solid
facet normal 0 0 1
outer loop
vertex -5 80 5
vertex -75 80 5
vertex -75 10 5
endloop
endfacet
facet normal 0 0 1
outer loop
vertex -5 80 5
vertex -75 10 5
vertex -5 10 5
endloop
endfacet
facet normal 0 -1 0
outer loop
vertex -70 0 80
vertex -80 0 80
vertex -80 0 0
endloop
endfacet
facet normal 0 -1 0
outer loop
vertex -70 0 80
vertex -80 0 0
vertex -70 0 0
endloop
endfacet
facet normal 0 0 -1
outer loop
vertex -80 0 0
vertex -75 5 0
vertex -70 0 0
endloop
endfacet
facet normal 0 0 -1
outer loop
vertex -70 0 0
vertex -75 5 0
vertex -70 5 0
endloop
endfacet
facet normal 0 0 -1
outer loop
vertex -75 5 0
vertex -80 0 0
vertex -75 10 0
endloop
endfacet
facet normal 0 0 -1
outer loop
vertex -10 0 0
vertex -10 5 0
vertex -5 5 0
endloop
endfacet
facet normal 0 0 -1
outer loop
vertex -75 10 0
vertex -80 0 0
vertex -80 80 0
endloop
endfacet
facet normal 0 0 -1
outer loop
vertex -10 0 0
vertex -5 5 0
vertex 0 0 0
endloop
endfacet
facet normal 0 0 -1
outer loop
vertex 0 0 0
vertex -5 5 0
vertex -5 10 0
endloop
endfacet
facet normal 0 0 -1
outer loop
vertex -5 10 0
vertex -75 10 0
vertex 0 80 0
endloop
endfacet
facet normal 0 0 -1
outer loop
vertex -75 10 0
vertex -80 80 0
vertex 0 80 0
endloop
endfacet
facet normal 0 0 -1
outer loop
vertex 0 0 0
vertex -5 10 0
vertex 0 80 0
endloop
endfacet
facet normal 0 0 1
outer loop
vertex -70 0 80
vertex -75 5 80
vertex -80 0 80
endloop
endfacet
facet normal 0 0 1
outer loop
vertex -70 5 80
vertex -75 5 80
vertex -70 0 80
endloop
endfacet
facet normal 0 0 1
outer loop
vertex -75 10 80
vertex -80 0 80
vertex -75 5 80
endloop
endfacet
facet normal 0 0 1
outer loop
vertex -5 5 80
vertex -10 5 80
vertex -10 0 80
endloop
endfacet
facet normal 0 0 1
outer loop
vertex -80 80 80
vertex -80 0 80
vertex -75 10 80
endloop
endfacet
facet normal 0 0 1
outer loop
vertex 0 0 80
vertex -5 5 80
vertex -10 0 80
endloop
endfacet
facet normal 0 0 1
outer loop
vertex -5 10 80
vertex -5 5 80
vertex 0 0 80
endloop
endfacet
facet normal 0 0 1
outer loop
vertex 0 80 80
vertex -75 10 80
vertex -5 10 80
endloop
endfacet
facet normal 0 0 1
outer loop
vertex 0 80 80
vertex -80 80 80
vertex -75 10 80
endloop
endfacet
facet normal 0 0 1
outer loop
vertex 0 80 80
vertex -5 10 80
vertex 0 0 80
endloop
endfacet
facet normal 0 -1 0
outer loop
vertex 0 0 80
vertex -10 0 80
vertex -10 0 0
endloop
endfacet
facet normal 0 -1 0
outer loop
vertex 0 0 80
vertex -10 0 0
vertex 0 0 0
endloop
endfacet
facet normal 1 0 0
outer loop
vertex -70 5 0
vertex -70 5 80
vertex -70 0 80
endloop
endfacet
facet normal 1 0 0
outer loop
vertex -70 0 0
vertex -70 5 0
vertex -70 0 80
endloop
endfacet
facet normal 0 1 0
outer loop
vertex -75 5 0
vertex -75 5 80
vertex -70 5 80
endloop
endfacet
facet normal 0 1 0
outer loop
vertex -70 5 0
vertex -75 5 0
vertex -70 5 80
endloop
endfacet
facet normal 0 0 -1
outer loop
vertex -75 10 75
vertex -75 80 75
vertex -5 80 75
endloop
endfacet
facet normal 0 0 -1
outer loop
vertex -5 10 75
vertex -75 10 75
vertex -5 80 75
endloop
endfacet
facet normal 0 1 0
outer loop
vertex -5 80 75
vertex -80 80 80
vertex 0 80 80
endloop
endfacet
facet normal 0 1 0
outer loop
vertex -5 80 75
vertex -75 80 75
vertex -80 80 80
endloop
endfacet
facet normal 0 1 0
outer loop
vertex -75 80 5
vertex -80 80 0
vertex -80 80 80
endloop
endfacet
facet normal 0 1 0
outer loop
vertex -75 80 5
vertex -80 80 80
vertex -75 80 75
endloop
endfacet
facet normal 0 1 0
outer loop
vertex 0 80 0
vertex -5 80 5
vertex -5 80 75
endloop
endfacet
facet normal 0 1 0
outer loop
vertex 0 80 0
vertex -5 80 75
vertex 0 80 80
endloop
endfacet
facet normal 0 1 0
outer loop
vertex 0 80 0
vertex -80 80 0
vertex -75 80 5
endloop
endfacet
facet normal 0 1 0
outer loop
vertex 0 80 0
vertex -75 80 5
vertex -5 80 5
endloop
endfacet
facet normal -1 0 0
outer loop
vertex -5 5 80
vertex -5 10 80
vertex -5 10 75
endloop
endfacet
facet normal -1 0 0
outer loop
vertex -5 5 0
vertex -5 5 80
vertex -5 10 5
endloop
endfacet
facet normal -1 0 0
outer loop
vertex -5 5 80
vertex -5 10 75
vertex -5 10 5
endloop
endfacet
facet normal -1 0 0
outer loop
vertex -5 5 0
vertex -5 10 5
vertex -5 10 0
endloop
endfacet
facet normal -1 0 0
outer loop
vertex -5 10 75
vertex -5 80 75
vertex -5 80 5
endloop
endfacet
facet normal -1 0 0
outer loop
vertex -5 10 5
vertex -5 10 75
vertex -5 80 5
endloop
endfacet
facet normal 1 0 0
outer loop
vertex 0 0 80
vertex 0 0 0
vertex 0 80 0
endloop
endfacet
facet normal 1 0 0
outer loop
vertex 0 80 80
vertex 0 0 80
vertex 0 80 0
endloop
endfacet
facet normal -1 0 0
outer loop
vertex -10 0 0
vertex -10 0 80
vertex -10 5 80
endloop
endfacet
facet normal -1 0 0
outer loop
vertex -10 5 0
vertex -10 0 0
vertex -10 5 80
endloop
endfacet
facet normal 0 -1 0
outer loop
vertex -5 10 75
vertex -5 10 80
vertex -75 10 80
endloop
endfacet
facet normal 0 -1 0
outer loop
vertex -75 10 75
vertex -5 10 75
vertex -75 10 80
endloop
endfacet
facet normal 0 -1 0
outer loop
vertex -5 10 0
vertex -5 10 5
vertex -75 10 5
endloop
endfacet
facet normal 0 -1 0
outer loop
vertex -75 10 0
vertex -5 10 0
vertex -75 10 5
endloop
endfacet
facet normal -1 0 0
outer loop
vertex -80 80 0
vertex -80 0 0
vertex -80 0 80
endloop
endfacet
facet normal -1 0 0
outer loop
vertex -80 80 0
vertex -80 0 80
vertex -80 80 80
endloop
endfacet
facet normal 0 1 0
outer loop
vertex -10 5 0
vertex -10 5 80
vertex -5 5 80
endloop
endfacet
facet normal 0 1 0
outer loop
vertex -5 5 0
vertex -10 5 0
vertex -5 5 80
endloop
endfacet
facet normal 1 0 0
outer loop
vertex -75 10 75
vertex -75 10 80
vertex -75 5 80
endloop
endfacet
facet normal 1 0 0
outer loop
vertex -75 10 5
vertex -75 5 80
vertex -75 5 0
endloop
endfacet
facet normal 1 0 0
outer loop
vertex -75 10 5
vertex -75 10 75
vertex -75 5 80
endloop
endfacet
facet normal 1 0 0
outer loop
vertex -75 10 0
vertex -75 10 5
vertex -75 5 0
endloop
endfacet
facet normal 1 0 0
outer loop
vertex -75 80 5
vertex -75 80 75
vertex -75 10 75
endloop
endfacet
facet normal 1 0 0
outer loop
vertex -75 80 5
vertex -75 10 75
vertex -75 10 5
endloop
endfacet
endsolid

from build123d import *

# Parameters (mm, degrees)
SKETCH1_W           = 80
SKETCH1_H           = 80
BOSS_EXTRUDE1_DEPTH = 80
CUT_EXTRUDE1_DEPTH  = 114
SKETCH3_W           = 70
SKETCH3_H           = 70
CUT_EXTRUDE3_DEPTH  = 70


with BuildPart() as part:
    # Sketch1 → Boss-Extrude1 (new body)
    with BuildSketch(Plane.XY):
        with Locations((-40, 40)):
            Rectangle(SKETCH1_W, SKETCH1_H)
    extrude(amount=BOSS_EXTRUDE1_DEPTH)

    # Sketch2 → Cut-Extrude1 (cut)
    with BuildSketch(Plane.XY.offset(80)):
        Polygon((-70, 5), (-70, 0), (-10, 0), (-10, 5), (-5, 5), (-5, 10), (-75, 10), (-75, 5), align=None)
    extrude(amount=-CUT_EXTRUDE1_DEPTH, mode=Mode.SUBTRACT)

    # Sketch3 → Cut-Extrude3 (cut)
    with BuildSketch(Plane(origin=(0, 80, 0), x_dir=(1, 0, 0), z_dir=(0, 1, 0))):
        with Locations((-40, -40)):
            Rectangle(SKETCH3_W, SKETCH3_H)
    extrude(amount=-CUT_EXTRUDE3_DEPTH, mode=Mode.SUBTRACT)


solid = part.part
